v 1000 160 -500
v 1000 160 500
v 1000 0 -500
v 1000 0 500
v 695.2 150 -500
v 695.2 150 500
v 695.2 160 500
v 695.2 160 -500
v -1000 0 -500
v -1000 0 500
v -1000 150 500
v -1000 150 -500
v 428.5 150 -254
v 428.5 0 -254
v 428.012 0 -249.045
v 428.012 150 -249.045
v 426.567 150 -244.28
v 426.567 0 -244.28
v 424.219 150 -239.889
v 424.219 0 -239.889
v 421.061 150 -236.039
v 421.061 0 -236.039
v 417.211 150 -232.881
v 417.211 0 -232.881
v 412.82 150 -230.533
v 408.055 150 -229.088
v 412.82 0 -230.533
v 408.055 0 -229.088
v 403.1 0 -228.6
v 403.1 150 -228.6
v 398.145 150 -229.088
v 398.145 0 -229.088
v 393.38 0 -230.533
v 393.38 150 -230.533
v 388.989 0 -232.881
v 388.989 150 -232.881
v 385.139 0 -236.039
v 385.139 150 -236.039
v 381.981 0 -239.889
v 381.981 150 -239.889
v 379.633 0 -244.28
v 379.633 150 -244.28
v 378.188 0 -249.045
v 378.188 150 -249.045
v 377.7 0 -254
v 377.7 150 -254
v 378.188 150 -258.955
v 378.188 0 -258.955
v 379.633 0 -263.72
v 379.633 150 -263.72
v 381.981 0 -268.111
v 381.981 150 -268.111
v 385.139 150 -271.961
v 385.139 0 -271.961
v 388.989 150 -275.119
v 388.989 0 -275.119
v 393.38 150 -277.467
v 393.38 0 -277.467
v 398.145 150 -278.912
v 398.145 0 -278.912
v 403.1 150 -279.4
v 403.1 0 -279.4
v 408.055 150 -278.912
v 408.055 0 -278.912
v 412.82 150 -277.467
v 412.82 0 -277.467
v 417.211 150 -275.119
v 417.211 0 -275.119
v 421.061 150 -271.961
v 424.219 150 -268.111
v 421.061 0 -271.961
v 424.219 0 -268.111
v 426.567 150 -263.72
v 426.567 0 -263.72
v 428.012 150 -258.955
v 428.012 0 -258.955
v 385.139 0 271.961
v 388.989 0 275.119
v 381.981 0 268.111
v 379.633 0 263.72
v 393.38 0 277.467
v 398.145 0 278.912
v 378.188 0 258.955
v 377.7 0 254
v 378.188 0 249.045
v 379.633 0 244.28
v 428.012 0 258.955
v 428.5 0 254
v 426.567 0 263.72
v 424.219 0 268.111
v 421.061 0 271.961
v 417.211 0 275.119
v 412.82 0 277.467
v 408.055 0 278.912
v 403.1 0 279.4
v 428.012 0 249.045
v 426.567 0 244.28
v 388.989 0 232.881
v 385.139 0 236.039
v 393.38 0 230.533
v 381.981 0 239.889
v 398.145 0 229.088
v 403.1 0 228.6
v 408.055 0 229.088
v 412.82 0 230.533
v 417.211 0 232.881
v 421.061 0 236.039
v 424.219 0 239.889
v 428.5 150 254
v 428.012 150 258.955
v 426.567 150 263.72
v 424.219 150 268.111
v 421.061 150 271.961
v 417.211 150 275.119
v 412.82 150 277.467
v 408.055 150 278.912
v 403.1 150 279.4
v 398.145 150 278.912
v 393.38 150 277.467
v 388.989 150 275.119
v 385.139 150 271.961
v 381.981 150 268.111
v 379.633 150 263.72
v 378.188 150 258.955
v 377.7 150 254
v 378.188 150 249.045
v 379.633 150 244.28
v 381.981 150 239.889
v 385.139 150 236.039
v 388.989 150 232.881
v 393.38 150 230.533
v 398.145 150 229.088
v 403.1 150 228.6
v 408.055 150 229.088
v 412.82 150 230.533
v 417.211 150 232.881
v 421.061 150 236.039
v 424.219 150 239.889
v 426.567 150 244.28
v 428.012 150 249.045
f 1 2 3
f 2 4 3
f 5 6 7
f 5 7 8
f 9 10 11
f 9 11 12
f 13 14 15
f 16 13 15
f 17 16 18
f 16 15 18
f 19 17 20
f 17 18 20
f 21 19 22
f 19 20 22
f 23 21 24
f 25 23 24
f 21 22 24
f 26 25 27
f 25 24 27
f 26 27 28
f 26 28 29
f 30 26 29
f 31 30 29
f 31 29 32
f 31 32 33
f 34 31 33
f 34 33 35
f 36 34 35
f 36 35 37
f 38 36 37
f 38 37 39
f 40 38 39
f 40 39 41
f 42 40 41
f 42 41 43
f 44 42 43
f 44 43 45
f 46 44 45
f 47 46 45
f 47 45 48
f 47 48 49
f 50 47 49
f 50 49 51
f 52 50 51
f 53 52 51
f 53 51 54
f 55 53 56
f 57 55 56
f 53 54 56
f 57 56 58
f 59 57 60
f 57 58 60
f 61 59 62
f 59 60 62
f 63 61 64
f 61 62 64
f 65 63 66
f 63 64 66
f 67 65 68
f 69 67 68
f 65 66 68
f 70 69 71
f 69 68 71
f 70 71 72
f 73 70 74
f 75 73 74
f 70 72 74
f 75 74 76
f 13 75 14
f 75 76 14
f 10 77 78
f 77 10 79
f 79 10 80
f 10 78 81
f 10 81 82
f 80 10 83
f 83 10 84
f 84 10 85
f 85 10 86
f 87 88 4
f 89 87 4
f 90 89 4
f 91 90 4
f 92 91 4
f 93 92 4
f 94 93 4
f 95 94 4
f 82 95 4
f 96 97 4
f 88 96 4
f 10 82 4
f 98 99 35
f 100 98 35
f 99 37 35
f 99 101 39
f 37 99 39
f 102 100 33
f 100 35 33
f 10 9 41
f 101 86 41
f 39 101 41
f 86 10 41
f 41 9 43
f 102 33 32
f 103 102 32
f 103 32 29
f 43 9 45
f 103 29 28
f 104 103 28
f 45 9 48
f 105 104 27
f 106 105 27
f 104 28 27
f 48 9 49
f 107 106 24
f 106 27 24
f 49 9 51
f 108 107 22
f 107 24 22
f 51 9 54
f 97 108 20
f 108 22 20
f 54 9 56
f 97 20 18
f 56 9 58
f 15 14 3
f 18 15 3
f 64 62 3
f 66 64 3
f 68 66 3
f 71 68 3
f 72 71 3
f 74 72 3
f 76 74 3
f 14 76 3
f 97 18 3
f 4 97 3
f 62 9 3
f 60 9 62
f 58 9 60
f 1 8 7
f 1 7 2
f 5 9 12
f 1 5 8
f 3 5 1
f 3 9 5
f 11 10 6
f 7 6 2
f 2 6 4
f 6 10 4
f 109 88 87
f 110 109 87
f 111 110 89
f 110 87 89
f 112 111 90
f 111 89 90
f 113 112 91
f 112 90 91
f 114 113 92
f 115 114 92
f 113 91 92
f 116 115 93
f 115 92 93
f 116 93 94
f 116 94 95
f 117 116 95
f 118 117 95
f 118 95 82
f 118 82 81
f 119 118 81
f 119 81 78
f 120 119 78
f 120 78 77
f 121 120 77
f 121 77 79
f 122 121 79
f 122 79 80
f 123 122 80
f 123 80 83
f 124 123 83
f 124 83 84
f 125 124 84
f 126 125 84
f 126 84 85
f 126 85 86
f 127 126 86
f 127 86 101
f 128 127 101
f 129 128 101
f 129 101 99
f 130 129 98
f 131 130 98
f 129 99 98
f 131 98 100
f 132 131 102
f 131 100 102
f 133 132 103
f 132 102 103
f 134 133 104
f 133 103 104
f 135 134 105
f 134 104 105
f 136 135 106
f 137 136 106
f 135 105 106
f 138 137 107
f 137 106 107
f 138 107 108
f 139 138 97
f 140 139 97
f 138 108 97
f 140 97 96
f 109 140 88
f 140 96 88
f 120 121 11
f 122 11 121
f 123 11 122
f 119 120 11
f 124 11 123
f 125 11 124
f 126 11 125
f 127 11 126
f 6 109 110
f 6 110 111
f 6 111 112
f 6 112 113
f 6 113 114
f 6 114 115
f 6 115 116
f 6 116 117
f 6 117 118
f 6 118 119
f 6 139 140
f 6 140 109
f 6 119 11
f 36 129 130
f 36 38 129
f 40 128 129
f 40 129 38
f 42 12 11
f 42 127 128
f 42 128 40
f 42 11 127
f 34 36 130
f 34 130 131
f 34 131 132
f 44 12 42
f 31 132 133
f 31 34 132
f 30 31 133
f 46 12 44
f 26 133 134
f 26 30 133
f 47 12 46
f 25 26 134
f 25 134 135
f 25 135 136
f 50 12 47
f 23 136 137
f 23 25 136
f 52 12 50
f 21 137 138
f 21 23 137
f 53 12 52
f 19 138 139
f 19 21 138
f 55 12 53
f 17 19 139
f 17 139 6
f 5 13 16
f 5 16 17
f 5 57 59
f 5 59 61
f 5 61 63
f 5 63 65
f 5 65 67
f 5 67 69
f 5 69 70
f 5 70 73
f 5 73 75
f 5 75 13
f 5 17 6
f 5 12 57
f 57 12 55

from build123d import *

# Parameters (mm, degrees)
SKETCH1_W           = 2000
SKETCH1_H           = 1000
BOSS_EXTRUDE1_DEPTH = 150
SKETCH2_W           = 304.8
SKETCH2_H           = 1000
BOSS_EXTRUDE2_DEPTH = 10
SKETCH3_R           = 25.4
CUT_EXTRUDE1_DEPTH  = 161


with BuildPart() as part:
    # Sketch1 → Boss-Extrude1 (new body)
    with BuildSketch(Plane(origin=(0, 0, 0), x_dir=(1, 0, 0), z_dir=(0, 1, 0))):
        Rectangle(SKETCH1_W, SKETCH1_H)
    extrude(amount=BOSS_EXTRUDE1_DEPTH)

    # Sketch2 → Boss-Extrude2 (add)
    with BuildSketch(Plane(origin=(0, 150, 0), x_dir=(1, 0, 0), z_dir=(0, 1, 0))):
        with Locations((847.6, 0)):
            Rectangle(SKETCH2_W, SKETCH2_H)
    extrude(amount=BOSS_EXTRUDE2_DEPTH)

    # Sketch3 → Cut-Extrude1 (cut, through all)
    with BuildSketch(Plane.XZ):
        with Locations((403.1, 254)):
            Circle(SKETCH3_R)
        with Locations((403.1, -254)):
            Circle(SKETCH3_R)
    extrude(amount=-CUT_EXTRUDE1_DEPTH, mode=Mode.SUBTRACT)


solid = part.part
